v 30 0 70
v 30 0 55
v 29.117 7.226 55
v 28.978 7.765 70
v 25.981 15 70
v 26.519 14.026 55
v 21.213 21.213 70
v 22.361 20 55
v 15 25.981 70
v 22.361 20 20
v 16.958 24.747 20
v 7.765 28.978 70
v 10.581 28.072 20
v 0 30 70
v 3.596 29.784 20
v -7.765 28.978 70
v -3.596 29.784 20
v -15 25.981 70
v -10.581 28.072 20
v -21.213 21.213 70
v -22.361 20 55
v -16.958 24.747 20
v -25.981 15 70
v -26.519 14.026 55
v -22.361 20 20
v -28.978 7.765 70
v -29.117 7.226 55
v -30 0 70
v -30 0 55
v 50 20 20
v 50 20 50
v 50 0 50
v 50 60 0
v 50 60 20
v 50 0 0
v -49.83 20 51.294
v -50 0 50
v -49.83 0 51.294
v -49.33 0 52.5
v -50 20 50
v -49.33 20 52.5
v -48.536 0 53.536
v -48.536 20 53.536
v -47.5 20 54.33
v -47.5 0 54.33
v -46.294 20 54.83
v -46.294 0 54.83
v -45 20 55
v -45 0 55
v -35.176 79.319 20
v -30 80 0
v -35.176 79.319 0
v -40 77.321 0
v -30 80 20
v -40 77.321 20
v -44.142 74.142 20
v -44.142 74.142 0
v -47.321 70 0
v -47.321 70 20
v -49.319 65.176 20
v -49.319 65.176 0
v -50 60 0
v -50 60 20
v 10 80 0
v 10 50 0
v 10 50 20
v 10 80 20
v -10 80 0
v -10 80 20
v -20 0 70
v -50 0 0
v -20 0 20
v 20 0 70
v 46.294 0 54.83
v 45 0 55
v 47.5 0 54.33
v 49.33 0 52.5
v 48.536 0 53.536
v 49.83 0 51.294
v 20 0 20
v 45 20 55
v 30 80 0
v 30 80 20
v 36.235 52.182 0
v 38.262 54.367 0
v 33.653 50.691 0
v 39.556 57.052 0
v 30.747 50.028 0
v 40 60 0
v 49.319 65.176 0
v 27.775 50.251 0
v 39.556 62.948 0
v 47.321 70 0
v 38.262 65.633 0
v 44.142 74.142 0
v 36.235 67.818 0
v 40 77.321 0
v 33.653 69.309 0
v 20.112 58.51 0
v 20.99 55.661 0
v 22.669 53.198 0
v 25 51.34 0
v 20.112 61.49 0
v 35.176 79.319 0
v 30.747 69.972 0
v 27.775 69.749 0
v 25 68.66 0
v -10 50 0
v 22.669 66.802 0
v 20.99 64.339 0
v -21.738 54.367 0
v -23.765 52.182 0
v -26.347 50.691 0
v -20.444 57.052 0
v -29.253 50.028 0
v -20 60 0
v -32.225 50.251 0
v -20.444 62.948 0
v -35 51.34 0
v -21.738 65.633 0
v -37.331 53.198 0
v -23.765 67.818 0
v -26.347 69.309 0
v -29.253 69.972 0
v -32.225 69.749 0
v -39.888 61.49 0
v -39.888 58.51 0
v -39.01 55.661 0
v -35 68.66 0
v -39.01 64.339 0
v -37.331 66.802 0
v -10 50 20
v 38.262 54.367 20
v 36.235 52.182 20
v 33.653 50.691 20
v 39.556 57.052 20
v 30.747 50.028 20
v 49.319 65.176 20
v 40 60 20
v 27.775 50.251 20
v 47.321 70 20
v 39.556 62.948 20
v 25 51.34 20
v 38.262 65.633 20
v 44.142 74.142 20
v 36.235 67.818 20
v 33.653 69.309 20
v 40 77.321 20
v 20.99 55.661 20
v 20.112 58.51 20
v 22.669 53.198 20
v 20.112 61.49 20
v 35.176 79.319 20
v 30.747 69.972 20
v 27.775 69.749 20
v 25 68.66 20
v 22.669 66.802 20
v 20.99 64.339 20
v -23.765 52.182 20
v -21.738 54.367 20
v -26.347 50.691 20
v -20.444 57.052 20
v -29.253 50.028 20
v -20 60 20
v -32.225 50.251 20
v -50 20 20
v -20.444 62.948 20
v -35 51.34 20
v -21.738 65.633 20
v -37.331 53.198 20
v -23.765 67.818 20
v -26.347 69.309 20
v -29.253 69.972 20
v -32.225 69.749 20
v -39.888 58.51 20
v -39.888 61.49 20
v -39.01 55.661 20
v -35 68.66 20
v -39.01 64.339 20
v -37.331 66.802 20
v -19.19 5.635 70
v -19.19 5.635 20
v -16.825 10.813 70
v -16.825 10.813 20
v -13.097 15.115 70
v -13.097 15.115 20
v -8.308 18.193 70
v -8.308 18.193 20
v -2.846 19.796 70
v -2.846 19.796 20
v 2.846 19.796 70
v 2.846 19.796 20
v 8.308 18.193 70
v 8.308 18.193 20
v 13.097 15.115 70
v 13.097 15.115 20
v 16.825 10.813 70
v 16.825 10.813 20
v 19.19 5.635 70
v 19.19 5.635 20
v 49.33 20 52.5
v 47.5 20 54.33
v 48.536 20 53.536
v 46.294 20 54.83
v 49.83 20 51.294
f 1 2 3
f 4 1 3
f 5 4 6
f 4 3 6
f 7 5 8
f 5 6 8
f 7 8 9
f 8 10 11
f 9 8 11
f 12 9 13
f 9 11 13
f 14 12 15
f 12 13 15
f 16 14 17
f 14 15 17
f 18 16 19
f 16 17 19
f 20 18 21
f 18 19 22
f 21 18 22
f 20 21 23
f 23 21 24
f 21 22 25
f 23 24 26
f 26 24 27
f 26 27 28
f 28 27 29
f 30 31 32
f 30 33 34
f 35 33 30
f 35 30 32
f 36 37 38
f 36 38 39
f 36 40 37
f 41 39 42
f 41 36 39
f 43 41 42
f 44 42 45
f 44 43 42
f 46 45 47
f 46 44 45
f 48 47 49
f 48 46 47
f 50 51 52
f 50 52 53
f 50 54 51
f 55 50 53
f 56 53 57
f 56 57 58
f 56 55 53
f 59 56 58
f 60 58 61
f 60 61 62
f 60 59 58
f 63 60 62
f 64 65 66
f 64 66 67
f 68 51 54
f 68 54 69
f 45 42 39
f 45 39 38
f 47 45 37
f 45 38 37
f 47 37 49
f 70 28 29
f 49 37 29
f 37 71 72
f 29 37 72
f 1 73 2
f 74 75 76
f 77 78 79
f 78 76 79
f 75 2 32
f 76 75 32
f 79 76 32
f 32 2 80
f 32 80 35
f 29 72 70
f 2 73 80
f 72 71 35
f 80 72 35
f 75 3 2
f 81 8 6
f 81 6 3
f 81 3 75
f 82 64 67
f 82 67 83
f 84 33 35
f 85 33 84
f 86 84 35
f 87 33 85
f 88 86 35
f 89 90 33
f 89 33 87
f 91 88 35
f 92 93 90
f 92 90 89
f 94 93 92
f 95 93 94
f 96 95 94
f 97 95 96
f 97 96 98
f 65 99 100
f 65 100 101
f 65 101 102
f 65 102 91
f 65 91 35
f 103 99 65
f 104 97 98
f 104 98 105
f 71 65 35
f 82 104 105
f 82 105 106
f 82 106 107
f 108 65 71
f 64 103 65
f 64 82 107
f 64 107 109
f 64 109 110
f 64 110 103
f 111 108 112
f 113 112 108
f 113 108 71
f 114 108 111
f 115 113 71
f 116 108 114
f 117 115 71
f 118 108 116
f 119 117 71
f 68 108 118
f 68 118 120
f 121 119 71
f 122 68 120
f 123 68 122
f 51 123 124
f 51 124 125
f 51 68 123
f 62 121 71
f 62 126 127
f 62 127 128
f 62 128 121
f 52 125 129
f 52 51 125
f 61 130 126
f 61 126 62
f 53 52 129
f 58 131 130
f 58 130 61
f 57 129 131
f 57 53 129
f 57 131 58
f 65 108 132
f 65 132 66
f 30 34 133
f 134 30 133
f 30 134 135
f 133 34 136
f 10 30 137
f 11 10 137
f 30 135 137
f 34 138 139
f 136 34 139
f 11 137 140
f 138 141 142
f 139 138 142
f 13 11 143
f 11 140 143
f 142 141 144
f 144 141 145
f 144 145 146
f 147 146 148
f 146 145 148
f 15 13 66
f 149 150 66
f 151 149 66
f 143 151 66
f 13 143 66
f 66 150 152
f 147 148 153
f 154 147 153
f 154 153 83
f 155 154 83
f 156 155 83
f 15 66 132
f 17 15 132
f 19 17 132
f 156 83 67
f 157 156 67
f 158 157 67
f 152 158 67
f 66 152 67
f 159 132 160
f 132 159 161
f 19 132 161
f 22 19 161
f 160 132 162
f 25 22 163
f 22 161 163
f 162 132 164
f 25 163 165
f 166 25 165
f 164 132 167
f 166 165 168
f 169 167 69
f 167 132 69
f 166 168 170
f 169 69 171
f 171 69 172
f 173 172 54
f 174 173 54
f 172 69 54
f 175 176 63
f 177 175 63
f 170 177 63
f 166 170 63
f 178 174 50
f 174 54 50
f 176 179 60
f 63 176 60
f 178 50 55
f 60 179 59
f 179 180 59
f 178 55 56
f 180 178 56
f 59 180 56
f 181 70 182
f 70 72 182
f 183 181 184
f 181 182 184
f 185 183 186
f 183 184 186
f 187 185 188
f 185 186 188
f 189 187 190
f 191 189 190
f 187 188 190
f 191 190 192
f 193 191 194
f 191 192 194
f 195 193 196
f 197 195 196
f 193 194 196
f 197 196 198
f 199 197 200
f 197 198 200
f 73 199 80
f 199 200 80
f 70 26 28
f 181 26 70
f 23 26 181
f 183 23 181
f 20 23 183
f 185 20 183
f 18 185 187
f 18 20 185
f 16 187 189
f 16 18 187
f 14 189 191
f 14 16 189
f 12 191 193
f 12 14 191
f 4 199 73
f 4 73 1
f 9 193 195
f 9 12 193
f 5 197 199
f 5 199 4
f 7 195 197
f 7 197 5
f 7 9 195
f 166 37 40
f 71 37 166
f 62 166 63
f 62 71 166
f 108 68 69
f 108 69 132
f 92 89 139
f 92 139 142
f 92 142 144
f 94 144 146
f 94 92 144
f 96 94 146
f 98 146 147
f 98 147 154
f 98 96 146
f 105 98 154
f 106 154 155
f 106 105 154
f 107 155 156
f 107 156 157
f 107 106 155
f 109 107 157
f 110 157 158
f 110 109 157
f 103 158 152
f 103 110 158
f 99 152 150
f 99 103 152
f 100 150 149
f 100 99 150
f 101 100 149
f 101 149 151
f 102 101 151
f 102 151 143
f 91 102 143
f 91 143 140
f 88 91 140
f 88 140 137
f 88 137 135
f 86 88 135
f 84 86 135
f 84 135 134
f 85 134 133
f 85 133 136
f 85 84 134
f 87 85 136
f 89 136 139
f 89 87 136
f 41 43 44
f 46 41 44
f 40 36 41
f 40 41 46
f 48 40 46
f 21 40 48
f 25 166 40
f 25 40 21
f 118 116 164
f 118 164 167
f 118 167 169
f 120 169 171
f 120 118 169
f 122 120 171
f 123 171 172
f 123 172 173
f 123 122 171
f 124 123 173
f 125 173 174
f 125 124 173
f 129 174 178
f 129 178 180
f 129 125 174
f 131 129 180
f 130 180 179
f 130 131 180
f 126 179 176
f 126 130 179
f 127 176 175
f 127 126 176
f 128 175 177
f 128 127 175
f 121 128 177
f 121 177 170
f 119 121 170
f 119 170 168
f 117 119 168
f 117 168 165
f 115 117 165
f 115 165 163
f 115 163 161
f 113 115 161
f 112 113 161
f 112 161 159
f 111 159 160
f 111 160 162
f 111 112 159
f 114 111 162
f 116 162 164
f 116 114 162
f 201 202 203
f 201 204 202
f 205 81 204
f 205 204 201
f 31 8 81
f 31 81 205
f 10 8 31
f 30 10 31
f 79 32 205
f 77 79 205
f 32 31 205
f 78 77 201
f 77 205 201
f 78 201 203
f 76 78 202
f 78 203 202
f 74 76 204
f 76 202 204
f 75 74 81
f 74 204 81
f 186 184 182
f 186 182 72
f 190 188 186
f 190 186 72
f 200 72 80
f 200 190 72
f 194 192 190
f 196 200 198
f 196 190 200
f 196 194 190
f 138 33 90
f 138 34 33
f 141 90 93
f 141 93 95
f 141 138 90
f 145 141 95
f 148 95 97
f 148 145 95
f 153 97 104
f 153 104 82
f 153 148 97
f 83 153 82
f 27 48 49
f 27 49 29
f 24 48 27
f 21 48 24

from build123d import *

# Parameters (mm, degrees)
SKETCH_1_R          = 10
EXTRUDE_1_DEPTH     = 20
FILLET_1_R          = 20
EXTRUDE_2_DEPTH     = 50
SKETCH_3_W          = 100
SKETCH_3_H          = 20
EXTRUDE_3_DEPTH     = 35
FILLET_2_R          = 5
CUT_EXTRUDE_START   = -50
CUT_EXTRUDE_1_DEPTH = 50


with BuildPart() as part:
    # 草圖1 → 填料-伸長1 (new body)
    with BuildSketch(Plane.XY):
        Polygon((-50, 80), (-10, 80), (-10, 50), (10, 50), (10, 80), (50, 80), (50, 0), (-50, 0), align=None)
        with Locations((-30, 60)):
            Circle(SKETCH_1_R, mode=Mode.SUBTRACT)
        with Locations((30, 60)):
            Circle(SKETCH_1_R, mode=Mode.SUBTRACT)
    extrude(amount=EXTRUDE_1_DEPTH)

    # 圓角1
    fillet_1_edges = [part.edges().sort_by_distance(p)[0] for p in [
        (-50, 80, 10),
        (50, 80, 10),
    ]]
    fillet(fillet_1_edges, radius=FILLET_1_R)

    # 草圖2 → 填料-伸長2 (add)
    with BuildSketch(Plane.XY.offset(20)):
        with BuildLine():
            ThreePointArc((-20, 0), (0, 20), (20, 0))
            Line((20, 0), (30, 0))
            ThreePointArc((30, 0), (0, 30), (-30, 0))
            Line((-30, 0), (-20, 0))
        make_face()
    extrude(amount=EXTRUDE_2_DEPTH)

    # 草圖3 → 填料-伸長3 (add)
    with BuildSketch(Plane.XY.offset(20)):
        with Locations((0, 10)):
            Rectangle(SKETCH_3_W, SKETCH_3_H)
    extrude(amount=EXTRUDE_3_DEPTH)

    # 圓角2
    fillet_2_edges = [part.edges().sort_by_distance(p)[0] for p in [
        (50, 10, 55),
        (-50, 10, 55),
    ]]
    fillet(fillet_2_edges, radius=FILLET_2_R)

    # 草圖4 → 除料-伸長1 (cut)
    with BuildSketch(Plane.XY.offset(70).offset(CUT_EXTRUDE_START)):
        with BuildLine():
            Line((-20, 0), (20, 0))
            ThreePointArc((20, 0), (0, 20), (-20, 0))
        make_face()
    extrude(amount=CUT_EXTRUDE_1_DEPTH, mode=Mode.SUBTRACT)


solid = part.part
